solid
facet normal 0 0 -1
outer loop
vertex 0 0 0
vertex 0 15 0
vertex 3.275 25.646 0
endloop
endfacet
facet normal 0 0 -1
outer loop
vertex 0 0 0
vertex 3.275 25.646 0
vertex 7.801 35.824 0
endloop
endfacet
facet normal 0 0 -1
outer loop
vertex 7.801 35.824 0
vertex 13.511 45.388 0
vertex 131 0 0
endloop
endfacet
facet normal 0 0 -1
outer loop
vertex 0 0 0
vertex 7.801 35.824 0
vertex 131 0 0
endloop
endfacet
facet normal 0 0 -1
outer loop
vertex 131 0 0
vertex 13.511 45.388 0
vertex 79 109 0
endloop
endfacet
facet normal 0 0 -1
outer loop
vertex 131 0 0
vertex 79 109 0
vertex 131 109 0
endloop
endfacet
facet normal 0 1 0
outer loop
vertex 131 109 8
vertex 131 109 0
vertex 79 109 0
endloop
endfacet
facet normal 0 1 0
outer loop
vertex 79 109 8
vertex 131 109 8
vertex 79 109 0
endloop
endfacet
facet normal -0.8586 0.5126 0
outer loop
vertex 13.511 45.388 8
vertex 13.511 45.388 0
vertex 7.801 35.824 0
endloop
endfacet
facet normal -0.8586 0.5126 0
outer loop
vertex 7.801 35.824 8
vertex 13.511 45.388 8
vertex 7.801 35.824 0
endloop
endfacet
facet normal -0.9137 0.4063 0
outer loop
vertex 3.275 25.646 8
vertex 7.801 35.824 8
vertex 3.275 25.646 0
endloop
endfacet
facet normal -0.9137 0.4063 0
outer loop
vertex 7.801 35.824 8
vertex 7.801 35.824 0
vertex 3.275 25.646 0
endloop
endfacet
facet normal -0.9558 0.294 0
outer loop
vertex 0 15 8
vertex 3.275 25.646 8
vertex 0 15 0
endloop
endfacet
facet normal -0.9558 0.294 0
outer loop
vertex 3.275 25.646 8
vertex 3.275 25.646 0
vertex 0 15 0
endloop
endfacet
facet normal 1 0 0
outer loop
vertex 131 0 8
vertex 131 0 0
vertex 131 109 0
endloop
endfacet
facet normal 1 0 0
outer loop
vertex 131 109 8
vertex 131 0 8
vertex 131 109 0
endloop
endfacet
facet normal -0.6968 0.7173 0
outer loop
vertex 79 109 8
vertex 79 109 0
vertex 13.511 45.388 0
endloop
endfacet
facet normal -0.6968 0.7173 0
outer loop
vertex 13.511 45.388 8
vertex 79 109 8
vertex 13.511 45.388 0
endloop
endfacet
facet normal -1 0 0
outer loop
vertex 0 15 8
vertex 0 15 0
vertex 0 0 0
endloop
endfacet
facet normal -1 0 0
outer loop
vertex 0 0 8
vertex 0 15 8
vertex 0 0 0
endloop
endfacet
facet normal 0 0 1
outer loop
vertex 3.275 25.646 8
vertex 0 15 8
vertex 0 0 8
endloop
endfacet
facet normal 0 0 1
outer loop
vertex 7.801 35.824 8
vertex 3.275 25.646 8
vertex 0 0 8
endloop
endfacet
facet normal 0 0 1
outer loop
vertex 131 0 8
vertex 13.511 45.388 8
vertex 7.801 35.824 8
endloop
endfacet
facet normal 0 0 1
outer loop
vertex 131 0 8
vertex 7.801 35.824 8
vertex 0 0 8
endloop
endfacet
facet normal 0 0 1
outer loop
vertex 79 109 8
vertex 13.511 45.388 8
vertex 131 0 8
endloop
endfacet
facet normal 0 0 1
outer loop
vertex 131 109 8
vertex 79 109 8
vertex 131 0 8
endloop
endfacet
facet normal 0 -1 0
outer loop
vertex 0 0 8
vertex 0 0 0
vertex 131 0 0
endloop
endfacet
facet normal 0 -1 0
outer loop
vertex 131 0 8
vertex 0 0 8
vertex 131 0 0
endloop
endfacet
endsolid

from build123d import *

# Parameters (mm, degrees)
Y_KSEKLIK_EKSTR_ZYON1_DEPTH = 8


with BuildPart() as part:
    # Çizim1 → Yükseklik-Ekstrüzyon1 (new body)
    with BuildSketch(Plane.XY):
        with BuildLine():
            Line((0, 15), (0, 0))
            Line((0, 0), (131, 0))
            Line((131, 0), (131, 109))
            Line((131, 109), (79, 109))
            Line((79, 109), (13.510611656, 45.388360721))
            ThreePointArc((13.510611656, 45.388360721), (5.385413078, 30.803232265), (0, 15))
        make_face()
    extrude(amount=Y_KSEKLIK_EKSTR_ZYON1_DEPTH)


solid = part.part
